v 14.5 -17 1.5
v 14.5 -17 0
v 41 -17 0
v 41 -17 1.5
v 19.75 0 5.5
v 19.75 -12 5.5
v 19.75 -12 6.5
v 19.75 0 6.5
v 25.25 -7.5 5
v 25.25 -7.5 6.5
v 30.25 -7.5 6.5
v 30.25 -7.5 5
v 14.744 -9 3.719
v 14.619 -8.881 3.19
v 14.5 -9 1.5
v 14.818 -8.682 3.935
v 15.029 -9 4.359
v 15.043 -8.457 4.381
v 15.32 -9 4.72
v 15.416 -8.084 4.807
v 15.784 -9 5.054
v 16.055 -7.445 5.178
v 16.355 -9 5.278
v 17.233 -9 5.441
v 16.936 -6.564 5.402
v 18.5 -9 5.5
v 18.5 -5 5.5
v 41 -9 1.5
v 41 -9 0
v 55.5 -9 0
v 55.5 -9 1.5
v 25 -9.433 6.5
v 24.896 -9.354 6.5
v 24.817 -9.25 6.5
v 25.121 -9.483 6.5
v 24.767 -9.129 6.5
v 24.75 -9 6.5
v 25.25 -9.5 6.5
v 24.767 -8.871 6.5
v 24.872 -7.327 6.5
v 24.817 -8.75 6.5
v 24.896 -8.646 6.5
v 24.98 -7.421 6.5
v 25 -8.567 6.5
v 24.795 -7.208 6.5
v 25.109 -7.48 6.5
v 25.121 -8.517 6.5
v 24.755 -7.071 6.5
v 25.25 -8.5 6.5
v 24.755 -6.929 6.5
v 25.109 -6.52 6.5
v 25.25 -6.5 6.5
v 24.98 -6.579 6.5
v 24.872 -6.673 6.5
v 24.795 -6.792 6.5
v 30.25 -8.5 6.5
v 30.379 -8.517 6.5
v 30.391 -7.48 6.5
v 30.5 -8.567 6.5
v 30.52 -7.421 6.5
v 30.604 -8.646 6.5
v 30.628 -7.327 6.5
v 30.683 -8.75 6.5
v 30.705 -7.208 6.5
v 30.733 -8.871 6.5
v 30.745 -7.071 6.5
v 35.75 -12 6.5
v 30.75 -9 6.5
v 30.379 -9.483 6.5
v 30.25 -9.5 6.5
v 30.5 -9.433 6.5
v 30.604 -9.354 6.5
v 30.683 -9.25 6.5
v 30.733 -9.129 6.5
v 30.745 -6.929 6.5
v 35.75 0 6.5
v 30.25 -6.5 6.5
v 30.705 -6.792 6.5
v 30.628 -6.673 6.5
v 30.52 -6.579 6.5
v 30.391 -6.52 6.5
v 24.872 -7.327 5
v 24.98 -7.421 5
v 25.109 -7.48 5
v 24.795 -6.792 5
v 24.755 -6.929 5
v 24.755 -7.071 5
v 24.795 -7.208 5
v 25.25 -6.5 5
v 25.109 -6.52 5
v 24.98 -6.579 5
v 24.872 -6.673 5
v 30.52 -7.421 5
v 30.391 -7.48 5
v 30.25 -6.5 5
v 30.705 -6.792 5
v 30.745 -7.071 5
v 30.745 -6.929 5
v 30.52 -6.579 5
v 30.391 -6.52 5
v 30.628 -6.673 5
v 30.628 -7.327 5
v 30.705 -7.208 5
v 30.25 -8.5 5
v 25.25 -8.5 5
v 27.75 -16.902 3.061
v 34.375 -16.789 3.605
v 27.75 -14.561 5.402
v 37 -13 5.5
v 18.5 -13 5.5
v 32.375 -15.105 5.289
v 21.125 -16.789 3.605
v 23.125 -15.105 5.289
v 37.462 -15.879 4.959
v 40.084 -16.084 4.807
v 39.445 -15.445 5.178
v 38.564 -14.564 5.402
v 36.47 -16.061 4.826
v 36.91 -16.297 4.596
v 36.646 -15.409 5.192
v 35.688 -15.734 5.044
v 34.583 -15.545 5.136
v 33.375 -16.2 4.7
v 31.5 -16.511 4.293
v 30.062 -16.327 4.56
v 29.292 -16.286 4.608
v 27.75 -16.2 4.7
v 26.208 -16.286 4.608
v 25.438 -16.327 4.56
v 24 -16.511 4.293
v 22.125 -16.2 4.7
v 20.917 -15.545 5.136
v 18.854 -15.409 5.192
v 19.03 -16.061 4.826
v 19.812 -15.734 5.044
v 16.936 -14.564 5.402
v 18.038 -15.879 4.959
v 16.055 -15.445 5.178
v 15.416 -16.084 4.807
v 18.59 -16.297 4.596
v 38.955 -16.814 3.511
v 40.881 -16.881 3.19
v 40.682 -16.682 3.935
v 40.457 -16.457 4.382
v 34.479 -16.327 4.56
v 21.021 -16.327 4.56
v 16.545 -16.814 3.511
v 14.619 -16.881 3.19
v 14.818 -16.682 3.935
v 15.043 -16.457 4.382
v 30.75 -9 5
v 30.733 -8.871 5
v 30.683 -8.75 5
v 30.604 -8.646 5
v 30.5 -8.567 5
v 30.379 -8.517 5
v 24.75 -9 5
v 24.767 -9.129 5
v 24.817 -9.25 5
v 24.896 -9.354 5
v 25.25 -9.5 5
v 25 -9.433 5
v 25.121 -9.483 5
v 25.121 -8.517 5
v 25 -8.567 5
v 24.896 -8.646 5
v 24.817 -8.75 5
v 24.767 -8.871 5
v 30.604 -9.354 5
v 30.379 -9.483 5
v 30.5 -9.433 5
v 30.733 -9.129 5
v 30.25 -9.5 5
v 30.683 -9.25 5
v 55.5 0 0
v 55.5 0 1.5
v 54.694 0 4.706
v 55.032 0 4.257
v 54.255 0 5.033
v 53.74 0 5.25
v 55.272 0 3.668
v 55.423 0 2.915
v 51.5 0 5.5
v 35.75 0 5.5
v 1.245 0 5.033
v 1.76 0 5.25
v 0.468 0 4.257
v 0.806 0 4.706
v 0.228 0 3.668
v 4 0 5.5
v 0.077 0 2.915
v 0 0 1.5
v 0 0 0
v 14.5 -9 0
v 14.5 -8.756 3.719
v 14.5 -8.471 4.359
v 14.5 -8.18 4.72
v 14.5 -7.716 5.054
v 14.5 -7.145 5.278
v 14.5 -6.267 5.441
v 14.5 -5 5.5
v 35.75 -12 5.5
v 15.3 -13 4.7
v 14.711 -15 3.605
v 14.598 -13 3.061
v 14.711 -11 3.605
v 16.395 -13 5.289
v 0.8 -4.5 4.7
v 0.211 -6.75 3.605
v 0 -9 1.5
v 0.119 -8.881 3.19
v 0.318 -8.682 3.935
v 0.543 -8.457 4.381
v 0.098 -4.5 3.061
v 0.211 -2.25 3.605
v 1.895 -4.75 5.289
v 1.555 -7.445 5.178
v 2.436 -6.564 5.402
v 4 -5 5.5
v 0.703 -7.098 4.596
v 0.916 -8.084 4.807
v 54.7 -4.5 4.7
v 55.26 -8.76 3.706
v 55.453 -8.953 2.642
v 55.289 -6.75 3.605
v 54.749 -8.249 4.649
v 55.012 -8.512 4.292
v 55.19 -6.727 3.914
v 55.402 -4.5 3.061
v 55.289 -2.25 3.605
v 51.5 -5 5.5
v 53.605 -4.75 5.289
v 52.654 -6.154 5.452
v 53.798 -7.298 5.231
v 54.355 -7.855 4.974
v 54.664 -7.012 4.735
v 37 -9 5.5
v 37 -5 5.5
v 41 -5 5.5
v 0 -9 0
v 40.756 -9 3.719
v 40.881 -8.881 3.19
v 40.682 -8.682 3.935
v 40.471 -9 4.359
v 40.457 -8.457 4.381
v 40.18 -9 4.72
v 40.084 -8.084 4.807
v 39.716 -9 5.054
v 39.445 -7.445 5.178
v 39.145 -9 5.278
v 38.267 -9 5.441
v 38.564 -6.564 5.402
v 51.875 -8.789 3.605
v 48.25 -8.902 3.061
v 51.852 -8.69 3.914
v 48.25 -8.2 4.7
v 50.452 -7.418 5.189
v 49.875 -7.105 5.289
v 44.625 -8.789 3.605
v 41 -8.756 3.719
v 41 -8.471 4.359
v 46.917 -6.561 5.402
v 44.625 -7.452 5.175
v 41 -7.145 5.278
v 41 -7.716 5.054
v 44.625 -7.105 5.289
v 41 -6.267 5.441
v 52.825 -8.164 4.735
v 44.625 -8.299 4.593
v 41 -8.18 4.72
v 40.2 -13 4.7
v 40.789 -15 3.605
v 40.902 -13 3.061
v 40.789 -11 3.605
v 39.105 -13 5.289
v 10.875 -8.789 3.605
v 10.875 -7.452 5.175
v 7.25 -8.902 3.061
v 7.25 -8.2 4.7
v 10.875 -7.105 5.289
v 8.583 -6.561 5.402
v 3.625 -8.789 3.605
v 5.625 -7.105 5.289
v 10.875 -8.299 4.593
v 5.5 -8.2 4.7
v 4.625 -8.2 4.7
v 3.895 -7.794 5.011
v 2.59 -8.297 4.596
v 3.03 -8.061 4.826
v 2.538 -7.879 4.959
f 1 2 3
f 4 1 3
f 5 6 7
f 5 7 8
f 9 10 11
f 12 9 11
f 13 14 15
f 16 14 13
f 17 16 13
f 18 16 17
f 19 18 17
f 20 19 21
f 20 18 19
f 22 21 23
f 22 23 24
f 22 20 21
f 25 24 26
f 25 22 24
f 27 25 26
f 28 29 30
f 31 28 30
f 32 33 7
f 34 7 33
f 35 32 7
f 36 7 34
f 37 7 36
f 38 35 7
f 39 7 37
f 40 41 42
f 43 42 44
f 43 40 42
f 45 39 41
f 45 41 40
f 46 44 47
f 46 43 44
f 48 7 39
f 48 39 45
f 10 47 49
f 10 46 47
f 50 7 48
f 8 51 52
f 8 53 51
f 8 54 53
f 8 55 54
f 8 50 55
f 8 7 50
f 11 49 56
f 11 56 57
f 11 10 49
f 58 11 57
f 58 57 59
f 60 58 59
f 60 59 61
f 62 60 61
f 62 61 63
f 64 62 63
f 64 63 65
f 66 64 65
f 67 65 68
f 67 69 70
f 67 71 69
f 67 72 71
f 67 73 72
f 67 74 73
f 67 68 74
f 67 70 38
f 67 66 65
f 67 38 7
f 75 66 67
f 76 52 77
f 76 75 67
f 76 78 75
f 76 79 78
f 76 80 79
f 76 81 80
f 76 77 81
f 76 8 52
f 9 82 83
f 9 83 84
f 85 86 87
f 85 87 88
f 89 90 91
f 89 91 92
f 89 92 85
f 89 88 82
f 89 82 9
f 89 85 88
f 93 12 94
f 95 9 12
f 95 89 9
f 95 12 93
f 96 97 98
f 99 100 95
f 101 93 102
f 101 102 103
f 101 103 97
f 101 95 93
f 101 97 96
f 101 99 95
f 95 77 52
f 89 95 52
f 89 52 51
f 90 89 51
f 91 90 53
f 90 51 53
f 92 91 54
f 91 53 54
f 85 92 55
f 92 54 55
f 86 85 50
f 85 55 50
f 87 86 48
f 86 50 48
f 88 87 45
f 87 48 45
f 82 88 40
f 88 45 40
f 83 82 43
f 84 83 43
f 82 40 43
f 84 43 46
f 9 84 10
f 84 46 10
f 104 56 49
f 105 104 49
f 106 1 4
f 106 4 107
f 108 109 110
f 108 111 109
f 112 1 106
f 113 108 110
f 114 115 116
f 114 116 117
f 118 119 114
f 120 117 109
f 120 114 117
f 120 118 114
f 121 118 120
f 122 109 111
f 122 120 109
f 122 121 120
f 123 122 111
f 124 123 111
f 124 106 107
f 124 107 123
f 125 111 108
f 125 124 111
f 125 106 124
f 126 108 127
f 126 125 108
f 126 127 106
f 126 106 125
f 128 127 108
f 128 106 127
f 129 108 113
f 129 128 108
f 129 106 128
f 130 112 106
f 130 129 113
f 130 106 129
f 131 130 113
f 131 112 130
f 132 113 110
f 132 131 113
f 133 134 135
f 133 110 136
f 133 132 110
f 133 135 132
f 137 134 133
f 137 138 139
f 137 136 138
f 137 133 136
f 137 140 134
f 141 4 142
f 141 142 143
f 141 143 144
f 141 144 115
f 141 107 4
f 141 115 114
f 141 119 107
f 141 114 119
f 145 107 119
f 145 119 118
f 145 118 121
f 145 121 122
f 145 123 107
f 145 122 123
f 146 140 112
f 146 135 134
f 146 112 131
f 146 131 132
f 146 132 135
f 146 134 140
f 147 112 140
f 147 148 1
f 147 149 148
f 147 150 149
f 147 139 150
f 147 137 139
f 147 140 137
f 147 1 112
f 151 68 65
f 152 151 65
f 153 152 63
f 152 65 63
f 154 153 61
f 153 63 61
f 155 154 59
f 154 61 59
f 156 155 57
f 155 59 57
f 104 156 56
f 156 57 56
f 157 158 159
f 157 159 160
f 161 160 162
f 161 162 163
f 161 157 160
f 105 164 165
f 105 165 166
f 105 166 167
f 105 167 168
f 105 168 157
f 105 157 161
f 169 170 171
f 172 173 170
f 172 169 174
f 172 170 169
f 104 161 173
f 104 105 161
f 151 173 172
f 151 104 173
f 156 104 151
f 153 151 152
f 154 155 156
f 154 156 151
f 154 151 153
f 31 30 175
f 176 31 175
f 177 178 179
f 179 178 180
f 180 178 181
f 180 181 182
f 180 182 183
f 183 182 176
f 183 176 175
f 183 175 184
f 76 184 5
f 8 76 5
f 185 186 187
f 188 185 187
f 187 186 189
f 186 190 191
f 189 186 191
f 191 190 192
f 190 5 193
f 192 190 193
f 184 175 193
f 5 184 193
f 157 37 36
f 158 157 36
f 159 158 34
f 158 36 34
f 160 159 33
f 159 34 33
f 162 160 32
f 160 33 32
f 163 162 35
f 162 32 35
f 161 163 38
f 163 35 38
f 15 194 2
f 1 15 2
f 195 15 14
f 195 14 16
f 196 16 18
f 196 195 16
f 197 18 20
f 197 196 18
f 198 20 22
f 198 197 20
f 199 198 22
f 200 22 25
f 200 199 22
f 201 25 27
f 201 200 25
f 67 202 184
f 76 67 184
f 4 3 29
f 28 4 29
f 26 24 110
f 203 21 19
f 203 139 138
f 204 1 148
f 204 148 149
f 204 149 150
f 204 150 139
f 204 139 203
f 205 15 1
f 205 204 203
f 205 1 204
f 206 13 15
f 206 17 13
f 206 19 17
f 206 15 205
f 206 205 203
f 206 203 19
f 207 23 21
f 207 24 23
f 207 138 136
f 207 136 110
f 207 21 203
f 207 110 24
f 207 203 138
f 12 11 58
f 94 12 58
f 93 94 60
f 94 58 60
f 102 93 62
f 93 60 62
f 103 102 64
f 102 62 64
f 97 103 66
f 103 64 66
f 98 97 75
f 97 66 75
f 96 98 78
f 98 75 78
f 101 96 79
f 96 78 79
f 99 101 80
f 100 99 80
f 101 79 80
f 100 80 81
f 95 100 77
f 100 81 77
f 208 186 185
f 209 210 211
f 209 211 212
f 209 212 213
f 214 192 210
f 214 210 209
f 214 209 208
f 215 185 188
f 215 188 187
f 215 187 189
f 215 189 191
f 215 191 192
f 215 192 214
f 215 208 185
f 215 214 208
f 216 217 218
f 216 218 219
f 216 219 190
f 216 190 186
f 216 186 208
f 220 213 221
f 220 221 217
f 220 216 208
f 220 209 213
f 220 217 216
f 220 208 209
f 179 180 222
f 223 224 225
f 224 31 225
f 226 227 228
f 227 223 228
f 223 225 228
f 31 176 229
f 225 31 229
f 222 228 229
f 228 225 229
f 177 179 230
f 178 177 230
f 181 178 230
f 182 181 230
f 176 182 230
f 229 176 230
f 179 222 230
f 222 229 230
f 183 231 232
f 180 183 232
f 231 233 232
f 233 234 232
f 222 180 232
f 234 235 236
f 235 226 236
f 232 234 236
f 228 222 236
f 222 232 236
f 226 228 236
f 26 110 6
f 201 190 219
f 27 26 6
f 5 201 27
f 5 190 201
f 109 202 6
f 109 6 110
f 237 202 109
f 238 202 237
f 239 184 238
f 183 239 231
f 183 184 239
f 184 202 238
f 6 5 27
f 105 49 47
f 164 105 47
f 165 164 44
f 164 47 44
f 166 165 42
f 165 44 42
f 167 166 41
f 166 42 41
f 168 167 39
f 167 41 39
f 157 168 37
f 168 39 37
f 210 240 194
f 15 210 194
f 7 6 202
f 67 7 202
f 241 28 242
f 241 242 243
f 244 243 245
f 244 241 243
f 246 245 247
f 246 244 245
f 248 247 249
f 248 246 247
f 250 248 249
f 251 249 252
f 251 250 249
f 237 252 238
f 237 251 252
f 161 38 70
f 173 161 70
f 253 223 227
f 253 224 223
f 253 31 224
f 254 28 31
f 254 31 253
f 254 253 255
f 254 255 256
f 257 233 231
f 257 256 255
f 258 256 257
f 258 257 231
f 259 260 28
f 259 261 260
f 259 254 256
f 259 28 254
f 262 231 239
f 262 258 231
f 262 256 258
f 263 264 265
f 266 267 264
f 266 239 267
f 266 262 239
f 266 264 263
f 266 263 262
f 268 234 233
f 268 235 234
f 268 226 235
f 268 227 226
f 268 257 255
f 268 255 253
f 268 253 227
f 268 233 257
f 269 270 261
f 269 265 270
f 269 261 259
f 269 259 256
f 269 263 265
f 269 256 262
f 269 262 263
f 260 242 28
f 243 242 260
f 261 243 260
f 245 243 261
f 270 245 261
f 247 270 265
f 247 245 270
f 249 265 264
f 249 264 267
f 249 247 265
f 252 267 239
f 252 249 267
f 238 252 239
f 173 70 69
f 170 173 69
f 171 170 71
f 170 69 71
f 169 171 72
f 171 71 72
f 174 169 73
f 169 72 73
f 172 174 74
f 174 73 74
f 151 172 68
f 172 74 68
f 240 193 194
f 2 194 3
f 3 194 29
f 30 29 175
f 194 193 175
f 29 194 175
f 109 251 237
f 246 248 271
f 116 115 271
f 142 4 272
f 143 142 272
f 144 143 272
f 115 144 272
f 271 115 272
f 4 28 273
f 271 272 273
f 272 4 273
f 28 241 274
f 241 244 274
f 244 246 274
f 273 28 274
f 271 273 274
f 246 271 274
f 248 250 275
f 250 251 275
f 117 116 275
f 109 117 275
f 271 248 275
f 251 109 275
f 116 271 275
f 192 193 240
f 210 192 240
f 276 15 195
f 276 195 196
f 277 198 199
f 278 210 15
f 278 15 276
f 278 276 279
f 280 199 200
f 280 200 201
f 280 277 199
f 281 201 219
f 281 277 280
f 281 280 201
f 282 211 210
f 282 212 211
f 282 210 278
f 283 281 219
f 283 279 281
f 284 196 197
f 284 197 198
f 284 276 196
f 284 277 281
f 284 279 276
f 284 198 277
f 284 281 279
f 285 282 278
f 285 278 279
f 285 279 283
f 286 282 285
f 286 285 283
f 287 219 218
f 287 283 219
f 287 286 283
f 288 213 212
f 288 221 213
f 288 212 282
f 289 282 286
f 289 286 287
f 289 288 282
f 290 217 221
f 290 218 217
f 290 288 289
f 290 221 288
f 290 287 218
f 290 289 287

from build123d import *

# Parameters (mm, degrees)
F1_DEPTH     = 5.5
F2_T1_DEPTH  = 24.5
F2_T3_DEPTH  = 29
F2_T5_DEPTH  = 46.5
F2_T7_DEPTH  = 18
F2_T9_DEPTH  = 24.5
F2_T15_DEPTH = 34.5
F2_T19_DEPTH = 28
F2_T26_DEPTH = 28
F2_T30_DEPTH = 34.5
F3_W         = 16
F3_H         = 12
F4_DEPTH     = 1
F6_DEPTH     = 1.5


# Not quite as in the source:
# - a fillet or chamfer that OpenCascade refuses, or shapes differently, is made with other operations: its cross-section is extruded or revolved along the edge and cut away or added


with BuildPart() as f1:
    # F0 (on Top) → F1 (new body)
    with BuildSketch(Plane.XY):
        Polygon((55.5, 0), (0, 0), (0, -9), (14.5, -9), (14.5, -17), (41, -17), (41, -9), (55.5, -9), align=None)
    extrude(amount=F1_DEPTH)

    # F2: fillet of radius 4 on 7 edges, made by hand

    # F2_s2 → F2_t1 (cut)
    with BuildSketch(Plane.YZ.offset(-10)):
        with BuildLine():
            add(Edge.make_bspline(
                [(-9, 1.5), (-9, 5.5), (-5, 5.5)],
                knots=[0, 0, 0, 1, 1, 1], degree=2, weights=[1, 1.5, 1]))
            Line((-5, 5.5), (-9, 5.5))
            Line((-9, 5.5), (-9, 1.5))
        make_face()
    extrude(amount=F2_T1_DEPTH, mode=Mode.SUBTRACT)

    # F2_s4 → F2_t3 (cut)
    with BuildSketch(Plane.XZ.offset(-10)):
        with BuildLine():
            add(Edge.make_bspline(
                [(0, 1.5), (0, 5.5), (4, 5.5)],
                knots=[0, 0, 0, 1, 1, 1], degree=2, weights=[1, 1.5, 1]))
            Line((4, 5.5), (0, 5.5))
            Line((0, 5.5), (0, 1.5))
        make_face()
        with BuildLine():
            add(Edge.make_bspline(
                [(55.5, 1.5), (55.5, 5.5), (51.5, 5.5)],
                knots=[0, 0, 0, 1, 1, 1], degree=2, weights=[1, 1.5, 1]))
            Line((51.5, 5.5), (55.5, 5.5))
            Line((55.5, 5.5), (55.5, 1.5))
        make_face()
    extrude(amount=F2_T3_DEPTH, mode=Mode.SUBTRACT)

    # F2_s6 → F2_t5 (cut)
    with BuildSketch(Plane.YZ.offset(4.5)):
        with BuildLine():
            add(Edge.make_bspline(
                [(-17, 1.5), (-17, 5.5), (-13, 5.5)],
                knots=[0, 0, 0, 1, 1, 1], degree=2, weights=[1, 1.5, 1]))
            Line((-13, 5.5), (-17, 5.5))
            Line((-17, 5.5), (-17, 1.5))
        make_face()
    extrude(amount=F2_T5_DEPTH, mode=Mode.SUBTRACT)

    # F2_s8 → F2_t7 (cut)
    with BuildSketch(Plane.XZ.offset(9)):
        with BuildLine():
            add(Edge.make_bspline(
                [(41, 1.5), (41, 5.5), (37, 5.5)],
                knots=[0, 0, 0, 1, 1, 1], degree=2, weights=[1, 1.5, 1]))
            Line((37, 5.5), (41, 5.5))
            Line((41, 5.5), (41, 1.5))
        make_face()
        with BuildLine():
            add(Edge.make_bspline(
                [(14.5, 1.5), (14.5, 5.5), (18.5, 5.5)],
                knots=[0, 0, 0, 1, 1, 1], degree=2, weights=[1, 1.5, 1]))
            Line((18.5, 5.5), (14.5, 5.5))
            Line((14.5, 5.5), (14.5, 1.5))
        make_face()
    extrude(amount=F2_T7_DEPTH, mode=Mode.SUBTRACT)

    # F2_s10 → F2_t9 (cut)
    with BuildSketch(Plane.YZ.offset(41)):
        with BuildLine():
            add(Edge.make_bspline(
                [(-9, 1.5), (-9, 5.5), (-5, 5.5)],
                knots=[0, 0, 0, 1, 1, 1], degree=2, weights=[1, 1.5, 1]))
            Line((-5, 5.5), (-9, 5.5))
            Line((-9, 5.5), (-9, 1.5))
        make_face()
    extrude(amount=F2_T9_DEPTH, mode=Mode.SUBTRACT)


with BuildPart() as f2_tool13:
    # F2_s14 → F2_t15 (new body)
    with BuildSketch(Plane.YZ.offset(-10)):
        with BuildLine():
            add(Edge.make_bspline(
                [(-9, 1.5), (-9, 5.5), (-5, 5.5)],
                knots=[0, 0, 0, 1, 1, 1], degree=2, weights=[1, 1.5, 1]))
            Line((-5, 5.5), (-9, 5.5))
            Line((-9, 5.5), (-9, 1.5))
        make_face()
    extrude(amount=F2_T15_DEPTH)

    split(bisect_by=Plane.YZ.offset(14.5), keep=Keep.TOP)


with BuildPart() as f2_tool17:
    # F2_s18 → F2_t19 (new body)
    with BuildSketch(Plane.XZ.offset(-1)):
        with BuildLine():
            add(Edge.make_bspline(
                [(14.5, 1.5), (14.5, 5.5), (18.5, 5.5)],
                knots=[0, 0, 0, 1, 1, 1], degree=2, weights=[1, 1.5, 1]))
            Line((18.5, 5.5), (14.5, 5.5))
            Line((14.5, 5.5), (14.5, 1.5))
        make_face()
    extrude(amount=F2_T19_DEPTH)

    split(bisect_by=Plane.XZ.offset(9), keep=Keep.BOTTOM)


with BuildPart() as f2_tool13_1:
    add(f2_tool13.part)

    # F2_t21: intersect F2_tool17
    add(f2_tool17.part, mode=Mode.INTERSECT)


with BuildPart() as f1_1:
    add(f1.part)

    # F2_t11: cut F2_tool13
    add(f2_tool13_1.part, mode=Mode.SUBTRACT)


with BuildPart() as f2_tool24:
    # F2_s25 → F2_t26 (new body)
    with BuildSketch(Plane.XZ.offset(27)):
        with BuildLine():
            add(Edge.make_bspline(
                [(41, 1.5), (41, 5.5), (37, 5.5)],
                knots=[0, 0, 0, 1, 1, 1], degree=2, weights=[1, 1.5, 1]))
            Line((37, 5.5), (41, 5.5))
            Line((41, 5.5), (41, 1.5))
        make_face()
    extrude(amount=-F2_T26_DEPTH)

    split(bisect_by=Plane.XZ.offset(9), keep=Keep.BOTTOM)


with BuildPart() as f2_tool28:
    # F2_s29 → F2_t30 (new body)
    with BuildSketch(Plane.YZ.offset(31)):
        with BuildLine():
            add(Edge.make_bspline(
                [(-9, 1.5), (-9, 5.5), (-5, 5.5)],
                knots=[0, 0, 0, 1, 1, 1], degree=2, weights=[1, 1.5, 1]))
            Line((-5, 5.5), (-9, 5.5))
            Line((-9, 5.5), (-9, 1.5))
        make_face()
    extrude(amount=F2_T30_DEPTH)

    split(bisect_by=Plane.YZ.offset(41), keep=Keep.BOTTOM)


with BuildPart() as f2_tool24_1:
    add(f2_tool24.part)

    # F2_t32: intersect F2_tool28
    add(f2_tool28.part, mode=Mode.INTERSECT)


with BuildPart() as f1_2:
    add(f1_1.part)

    # F2_t22: cut F2_tool24
    add(f2_tool24_1.part, mode=Mode.SUBTRACT)

    # F3 (on face) → F4 (join)
    with BuildSketch(Plane.XY.offset(5.5)):
        with Locations((27.75, -6)):
            Rectangle(F3_W, F3_H)
    extrude(amount=F4_DEPTH)

    # F5 (on face) → F6 (cut)
    with BuildSketch(Plane.XY.offset(6.5)):
        with BuildLine():
            ThreePointArc((25.25, -6.5), (24.75, -7), (25.25, -7.5))
            Line((25.25, -7.5), (30.25, -7.5))
            ThreePointArc((30.25, -7.5), (30.75, -7), (30.25, -6.5))
            Line((30.25, -6.5), (25.25, -6.5))
        make_face()
        with BuildLine():
            Line((30.25, -9), (25.25, -9))
            Line((25.25, -9), (24.75, -9))
            ThreePointArc((24.75, -9), (24.8964466094, -9.3535533906), (25.25, -9.5))
            Line((25.25, -9.5), (30.25, -9.5))
            ThreePointArc((30.25, -9.5), (30.6035533906, -9.3535533906), (30.75, -9))
            Line((30.75, -9), (30.25, -9))
        make_face()
        with BuildLine():
            Line((24.75, -9), (25.25, -9))
            Line((25.25, -9), (30.25, -9))
            Line((30.25, -9), (30.75, -9))
            ThreePointArc((30.75, -9), (30.6035533906, -8.6464466094), (30.25, -8.5))
            Line((30.25, -8.5), (25.25, -8.5))
            ThreePointArc((25.25, -8.5), (24.8964466094, -8.6464466094), (24.75, -9))
        make_face()
    extrude(amount=-F6_DEPTH, mode=Mode.SUBTRACT)


solid = f1_2.part
